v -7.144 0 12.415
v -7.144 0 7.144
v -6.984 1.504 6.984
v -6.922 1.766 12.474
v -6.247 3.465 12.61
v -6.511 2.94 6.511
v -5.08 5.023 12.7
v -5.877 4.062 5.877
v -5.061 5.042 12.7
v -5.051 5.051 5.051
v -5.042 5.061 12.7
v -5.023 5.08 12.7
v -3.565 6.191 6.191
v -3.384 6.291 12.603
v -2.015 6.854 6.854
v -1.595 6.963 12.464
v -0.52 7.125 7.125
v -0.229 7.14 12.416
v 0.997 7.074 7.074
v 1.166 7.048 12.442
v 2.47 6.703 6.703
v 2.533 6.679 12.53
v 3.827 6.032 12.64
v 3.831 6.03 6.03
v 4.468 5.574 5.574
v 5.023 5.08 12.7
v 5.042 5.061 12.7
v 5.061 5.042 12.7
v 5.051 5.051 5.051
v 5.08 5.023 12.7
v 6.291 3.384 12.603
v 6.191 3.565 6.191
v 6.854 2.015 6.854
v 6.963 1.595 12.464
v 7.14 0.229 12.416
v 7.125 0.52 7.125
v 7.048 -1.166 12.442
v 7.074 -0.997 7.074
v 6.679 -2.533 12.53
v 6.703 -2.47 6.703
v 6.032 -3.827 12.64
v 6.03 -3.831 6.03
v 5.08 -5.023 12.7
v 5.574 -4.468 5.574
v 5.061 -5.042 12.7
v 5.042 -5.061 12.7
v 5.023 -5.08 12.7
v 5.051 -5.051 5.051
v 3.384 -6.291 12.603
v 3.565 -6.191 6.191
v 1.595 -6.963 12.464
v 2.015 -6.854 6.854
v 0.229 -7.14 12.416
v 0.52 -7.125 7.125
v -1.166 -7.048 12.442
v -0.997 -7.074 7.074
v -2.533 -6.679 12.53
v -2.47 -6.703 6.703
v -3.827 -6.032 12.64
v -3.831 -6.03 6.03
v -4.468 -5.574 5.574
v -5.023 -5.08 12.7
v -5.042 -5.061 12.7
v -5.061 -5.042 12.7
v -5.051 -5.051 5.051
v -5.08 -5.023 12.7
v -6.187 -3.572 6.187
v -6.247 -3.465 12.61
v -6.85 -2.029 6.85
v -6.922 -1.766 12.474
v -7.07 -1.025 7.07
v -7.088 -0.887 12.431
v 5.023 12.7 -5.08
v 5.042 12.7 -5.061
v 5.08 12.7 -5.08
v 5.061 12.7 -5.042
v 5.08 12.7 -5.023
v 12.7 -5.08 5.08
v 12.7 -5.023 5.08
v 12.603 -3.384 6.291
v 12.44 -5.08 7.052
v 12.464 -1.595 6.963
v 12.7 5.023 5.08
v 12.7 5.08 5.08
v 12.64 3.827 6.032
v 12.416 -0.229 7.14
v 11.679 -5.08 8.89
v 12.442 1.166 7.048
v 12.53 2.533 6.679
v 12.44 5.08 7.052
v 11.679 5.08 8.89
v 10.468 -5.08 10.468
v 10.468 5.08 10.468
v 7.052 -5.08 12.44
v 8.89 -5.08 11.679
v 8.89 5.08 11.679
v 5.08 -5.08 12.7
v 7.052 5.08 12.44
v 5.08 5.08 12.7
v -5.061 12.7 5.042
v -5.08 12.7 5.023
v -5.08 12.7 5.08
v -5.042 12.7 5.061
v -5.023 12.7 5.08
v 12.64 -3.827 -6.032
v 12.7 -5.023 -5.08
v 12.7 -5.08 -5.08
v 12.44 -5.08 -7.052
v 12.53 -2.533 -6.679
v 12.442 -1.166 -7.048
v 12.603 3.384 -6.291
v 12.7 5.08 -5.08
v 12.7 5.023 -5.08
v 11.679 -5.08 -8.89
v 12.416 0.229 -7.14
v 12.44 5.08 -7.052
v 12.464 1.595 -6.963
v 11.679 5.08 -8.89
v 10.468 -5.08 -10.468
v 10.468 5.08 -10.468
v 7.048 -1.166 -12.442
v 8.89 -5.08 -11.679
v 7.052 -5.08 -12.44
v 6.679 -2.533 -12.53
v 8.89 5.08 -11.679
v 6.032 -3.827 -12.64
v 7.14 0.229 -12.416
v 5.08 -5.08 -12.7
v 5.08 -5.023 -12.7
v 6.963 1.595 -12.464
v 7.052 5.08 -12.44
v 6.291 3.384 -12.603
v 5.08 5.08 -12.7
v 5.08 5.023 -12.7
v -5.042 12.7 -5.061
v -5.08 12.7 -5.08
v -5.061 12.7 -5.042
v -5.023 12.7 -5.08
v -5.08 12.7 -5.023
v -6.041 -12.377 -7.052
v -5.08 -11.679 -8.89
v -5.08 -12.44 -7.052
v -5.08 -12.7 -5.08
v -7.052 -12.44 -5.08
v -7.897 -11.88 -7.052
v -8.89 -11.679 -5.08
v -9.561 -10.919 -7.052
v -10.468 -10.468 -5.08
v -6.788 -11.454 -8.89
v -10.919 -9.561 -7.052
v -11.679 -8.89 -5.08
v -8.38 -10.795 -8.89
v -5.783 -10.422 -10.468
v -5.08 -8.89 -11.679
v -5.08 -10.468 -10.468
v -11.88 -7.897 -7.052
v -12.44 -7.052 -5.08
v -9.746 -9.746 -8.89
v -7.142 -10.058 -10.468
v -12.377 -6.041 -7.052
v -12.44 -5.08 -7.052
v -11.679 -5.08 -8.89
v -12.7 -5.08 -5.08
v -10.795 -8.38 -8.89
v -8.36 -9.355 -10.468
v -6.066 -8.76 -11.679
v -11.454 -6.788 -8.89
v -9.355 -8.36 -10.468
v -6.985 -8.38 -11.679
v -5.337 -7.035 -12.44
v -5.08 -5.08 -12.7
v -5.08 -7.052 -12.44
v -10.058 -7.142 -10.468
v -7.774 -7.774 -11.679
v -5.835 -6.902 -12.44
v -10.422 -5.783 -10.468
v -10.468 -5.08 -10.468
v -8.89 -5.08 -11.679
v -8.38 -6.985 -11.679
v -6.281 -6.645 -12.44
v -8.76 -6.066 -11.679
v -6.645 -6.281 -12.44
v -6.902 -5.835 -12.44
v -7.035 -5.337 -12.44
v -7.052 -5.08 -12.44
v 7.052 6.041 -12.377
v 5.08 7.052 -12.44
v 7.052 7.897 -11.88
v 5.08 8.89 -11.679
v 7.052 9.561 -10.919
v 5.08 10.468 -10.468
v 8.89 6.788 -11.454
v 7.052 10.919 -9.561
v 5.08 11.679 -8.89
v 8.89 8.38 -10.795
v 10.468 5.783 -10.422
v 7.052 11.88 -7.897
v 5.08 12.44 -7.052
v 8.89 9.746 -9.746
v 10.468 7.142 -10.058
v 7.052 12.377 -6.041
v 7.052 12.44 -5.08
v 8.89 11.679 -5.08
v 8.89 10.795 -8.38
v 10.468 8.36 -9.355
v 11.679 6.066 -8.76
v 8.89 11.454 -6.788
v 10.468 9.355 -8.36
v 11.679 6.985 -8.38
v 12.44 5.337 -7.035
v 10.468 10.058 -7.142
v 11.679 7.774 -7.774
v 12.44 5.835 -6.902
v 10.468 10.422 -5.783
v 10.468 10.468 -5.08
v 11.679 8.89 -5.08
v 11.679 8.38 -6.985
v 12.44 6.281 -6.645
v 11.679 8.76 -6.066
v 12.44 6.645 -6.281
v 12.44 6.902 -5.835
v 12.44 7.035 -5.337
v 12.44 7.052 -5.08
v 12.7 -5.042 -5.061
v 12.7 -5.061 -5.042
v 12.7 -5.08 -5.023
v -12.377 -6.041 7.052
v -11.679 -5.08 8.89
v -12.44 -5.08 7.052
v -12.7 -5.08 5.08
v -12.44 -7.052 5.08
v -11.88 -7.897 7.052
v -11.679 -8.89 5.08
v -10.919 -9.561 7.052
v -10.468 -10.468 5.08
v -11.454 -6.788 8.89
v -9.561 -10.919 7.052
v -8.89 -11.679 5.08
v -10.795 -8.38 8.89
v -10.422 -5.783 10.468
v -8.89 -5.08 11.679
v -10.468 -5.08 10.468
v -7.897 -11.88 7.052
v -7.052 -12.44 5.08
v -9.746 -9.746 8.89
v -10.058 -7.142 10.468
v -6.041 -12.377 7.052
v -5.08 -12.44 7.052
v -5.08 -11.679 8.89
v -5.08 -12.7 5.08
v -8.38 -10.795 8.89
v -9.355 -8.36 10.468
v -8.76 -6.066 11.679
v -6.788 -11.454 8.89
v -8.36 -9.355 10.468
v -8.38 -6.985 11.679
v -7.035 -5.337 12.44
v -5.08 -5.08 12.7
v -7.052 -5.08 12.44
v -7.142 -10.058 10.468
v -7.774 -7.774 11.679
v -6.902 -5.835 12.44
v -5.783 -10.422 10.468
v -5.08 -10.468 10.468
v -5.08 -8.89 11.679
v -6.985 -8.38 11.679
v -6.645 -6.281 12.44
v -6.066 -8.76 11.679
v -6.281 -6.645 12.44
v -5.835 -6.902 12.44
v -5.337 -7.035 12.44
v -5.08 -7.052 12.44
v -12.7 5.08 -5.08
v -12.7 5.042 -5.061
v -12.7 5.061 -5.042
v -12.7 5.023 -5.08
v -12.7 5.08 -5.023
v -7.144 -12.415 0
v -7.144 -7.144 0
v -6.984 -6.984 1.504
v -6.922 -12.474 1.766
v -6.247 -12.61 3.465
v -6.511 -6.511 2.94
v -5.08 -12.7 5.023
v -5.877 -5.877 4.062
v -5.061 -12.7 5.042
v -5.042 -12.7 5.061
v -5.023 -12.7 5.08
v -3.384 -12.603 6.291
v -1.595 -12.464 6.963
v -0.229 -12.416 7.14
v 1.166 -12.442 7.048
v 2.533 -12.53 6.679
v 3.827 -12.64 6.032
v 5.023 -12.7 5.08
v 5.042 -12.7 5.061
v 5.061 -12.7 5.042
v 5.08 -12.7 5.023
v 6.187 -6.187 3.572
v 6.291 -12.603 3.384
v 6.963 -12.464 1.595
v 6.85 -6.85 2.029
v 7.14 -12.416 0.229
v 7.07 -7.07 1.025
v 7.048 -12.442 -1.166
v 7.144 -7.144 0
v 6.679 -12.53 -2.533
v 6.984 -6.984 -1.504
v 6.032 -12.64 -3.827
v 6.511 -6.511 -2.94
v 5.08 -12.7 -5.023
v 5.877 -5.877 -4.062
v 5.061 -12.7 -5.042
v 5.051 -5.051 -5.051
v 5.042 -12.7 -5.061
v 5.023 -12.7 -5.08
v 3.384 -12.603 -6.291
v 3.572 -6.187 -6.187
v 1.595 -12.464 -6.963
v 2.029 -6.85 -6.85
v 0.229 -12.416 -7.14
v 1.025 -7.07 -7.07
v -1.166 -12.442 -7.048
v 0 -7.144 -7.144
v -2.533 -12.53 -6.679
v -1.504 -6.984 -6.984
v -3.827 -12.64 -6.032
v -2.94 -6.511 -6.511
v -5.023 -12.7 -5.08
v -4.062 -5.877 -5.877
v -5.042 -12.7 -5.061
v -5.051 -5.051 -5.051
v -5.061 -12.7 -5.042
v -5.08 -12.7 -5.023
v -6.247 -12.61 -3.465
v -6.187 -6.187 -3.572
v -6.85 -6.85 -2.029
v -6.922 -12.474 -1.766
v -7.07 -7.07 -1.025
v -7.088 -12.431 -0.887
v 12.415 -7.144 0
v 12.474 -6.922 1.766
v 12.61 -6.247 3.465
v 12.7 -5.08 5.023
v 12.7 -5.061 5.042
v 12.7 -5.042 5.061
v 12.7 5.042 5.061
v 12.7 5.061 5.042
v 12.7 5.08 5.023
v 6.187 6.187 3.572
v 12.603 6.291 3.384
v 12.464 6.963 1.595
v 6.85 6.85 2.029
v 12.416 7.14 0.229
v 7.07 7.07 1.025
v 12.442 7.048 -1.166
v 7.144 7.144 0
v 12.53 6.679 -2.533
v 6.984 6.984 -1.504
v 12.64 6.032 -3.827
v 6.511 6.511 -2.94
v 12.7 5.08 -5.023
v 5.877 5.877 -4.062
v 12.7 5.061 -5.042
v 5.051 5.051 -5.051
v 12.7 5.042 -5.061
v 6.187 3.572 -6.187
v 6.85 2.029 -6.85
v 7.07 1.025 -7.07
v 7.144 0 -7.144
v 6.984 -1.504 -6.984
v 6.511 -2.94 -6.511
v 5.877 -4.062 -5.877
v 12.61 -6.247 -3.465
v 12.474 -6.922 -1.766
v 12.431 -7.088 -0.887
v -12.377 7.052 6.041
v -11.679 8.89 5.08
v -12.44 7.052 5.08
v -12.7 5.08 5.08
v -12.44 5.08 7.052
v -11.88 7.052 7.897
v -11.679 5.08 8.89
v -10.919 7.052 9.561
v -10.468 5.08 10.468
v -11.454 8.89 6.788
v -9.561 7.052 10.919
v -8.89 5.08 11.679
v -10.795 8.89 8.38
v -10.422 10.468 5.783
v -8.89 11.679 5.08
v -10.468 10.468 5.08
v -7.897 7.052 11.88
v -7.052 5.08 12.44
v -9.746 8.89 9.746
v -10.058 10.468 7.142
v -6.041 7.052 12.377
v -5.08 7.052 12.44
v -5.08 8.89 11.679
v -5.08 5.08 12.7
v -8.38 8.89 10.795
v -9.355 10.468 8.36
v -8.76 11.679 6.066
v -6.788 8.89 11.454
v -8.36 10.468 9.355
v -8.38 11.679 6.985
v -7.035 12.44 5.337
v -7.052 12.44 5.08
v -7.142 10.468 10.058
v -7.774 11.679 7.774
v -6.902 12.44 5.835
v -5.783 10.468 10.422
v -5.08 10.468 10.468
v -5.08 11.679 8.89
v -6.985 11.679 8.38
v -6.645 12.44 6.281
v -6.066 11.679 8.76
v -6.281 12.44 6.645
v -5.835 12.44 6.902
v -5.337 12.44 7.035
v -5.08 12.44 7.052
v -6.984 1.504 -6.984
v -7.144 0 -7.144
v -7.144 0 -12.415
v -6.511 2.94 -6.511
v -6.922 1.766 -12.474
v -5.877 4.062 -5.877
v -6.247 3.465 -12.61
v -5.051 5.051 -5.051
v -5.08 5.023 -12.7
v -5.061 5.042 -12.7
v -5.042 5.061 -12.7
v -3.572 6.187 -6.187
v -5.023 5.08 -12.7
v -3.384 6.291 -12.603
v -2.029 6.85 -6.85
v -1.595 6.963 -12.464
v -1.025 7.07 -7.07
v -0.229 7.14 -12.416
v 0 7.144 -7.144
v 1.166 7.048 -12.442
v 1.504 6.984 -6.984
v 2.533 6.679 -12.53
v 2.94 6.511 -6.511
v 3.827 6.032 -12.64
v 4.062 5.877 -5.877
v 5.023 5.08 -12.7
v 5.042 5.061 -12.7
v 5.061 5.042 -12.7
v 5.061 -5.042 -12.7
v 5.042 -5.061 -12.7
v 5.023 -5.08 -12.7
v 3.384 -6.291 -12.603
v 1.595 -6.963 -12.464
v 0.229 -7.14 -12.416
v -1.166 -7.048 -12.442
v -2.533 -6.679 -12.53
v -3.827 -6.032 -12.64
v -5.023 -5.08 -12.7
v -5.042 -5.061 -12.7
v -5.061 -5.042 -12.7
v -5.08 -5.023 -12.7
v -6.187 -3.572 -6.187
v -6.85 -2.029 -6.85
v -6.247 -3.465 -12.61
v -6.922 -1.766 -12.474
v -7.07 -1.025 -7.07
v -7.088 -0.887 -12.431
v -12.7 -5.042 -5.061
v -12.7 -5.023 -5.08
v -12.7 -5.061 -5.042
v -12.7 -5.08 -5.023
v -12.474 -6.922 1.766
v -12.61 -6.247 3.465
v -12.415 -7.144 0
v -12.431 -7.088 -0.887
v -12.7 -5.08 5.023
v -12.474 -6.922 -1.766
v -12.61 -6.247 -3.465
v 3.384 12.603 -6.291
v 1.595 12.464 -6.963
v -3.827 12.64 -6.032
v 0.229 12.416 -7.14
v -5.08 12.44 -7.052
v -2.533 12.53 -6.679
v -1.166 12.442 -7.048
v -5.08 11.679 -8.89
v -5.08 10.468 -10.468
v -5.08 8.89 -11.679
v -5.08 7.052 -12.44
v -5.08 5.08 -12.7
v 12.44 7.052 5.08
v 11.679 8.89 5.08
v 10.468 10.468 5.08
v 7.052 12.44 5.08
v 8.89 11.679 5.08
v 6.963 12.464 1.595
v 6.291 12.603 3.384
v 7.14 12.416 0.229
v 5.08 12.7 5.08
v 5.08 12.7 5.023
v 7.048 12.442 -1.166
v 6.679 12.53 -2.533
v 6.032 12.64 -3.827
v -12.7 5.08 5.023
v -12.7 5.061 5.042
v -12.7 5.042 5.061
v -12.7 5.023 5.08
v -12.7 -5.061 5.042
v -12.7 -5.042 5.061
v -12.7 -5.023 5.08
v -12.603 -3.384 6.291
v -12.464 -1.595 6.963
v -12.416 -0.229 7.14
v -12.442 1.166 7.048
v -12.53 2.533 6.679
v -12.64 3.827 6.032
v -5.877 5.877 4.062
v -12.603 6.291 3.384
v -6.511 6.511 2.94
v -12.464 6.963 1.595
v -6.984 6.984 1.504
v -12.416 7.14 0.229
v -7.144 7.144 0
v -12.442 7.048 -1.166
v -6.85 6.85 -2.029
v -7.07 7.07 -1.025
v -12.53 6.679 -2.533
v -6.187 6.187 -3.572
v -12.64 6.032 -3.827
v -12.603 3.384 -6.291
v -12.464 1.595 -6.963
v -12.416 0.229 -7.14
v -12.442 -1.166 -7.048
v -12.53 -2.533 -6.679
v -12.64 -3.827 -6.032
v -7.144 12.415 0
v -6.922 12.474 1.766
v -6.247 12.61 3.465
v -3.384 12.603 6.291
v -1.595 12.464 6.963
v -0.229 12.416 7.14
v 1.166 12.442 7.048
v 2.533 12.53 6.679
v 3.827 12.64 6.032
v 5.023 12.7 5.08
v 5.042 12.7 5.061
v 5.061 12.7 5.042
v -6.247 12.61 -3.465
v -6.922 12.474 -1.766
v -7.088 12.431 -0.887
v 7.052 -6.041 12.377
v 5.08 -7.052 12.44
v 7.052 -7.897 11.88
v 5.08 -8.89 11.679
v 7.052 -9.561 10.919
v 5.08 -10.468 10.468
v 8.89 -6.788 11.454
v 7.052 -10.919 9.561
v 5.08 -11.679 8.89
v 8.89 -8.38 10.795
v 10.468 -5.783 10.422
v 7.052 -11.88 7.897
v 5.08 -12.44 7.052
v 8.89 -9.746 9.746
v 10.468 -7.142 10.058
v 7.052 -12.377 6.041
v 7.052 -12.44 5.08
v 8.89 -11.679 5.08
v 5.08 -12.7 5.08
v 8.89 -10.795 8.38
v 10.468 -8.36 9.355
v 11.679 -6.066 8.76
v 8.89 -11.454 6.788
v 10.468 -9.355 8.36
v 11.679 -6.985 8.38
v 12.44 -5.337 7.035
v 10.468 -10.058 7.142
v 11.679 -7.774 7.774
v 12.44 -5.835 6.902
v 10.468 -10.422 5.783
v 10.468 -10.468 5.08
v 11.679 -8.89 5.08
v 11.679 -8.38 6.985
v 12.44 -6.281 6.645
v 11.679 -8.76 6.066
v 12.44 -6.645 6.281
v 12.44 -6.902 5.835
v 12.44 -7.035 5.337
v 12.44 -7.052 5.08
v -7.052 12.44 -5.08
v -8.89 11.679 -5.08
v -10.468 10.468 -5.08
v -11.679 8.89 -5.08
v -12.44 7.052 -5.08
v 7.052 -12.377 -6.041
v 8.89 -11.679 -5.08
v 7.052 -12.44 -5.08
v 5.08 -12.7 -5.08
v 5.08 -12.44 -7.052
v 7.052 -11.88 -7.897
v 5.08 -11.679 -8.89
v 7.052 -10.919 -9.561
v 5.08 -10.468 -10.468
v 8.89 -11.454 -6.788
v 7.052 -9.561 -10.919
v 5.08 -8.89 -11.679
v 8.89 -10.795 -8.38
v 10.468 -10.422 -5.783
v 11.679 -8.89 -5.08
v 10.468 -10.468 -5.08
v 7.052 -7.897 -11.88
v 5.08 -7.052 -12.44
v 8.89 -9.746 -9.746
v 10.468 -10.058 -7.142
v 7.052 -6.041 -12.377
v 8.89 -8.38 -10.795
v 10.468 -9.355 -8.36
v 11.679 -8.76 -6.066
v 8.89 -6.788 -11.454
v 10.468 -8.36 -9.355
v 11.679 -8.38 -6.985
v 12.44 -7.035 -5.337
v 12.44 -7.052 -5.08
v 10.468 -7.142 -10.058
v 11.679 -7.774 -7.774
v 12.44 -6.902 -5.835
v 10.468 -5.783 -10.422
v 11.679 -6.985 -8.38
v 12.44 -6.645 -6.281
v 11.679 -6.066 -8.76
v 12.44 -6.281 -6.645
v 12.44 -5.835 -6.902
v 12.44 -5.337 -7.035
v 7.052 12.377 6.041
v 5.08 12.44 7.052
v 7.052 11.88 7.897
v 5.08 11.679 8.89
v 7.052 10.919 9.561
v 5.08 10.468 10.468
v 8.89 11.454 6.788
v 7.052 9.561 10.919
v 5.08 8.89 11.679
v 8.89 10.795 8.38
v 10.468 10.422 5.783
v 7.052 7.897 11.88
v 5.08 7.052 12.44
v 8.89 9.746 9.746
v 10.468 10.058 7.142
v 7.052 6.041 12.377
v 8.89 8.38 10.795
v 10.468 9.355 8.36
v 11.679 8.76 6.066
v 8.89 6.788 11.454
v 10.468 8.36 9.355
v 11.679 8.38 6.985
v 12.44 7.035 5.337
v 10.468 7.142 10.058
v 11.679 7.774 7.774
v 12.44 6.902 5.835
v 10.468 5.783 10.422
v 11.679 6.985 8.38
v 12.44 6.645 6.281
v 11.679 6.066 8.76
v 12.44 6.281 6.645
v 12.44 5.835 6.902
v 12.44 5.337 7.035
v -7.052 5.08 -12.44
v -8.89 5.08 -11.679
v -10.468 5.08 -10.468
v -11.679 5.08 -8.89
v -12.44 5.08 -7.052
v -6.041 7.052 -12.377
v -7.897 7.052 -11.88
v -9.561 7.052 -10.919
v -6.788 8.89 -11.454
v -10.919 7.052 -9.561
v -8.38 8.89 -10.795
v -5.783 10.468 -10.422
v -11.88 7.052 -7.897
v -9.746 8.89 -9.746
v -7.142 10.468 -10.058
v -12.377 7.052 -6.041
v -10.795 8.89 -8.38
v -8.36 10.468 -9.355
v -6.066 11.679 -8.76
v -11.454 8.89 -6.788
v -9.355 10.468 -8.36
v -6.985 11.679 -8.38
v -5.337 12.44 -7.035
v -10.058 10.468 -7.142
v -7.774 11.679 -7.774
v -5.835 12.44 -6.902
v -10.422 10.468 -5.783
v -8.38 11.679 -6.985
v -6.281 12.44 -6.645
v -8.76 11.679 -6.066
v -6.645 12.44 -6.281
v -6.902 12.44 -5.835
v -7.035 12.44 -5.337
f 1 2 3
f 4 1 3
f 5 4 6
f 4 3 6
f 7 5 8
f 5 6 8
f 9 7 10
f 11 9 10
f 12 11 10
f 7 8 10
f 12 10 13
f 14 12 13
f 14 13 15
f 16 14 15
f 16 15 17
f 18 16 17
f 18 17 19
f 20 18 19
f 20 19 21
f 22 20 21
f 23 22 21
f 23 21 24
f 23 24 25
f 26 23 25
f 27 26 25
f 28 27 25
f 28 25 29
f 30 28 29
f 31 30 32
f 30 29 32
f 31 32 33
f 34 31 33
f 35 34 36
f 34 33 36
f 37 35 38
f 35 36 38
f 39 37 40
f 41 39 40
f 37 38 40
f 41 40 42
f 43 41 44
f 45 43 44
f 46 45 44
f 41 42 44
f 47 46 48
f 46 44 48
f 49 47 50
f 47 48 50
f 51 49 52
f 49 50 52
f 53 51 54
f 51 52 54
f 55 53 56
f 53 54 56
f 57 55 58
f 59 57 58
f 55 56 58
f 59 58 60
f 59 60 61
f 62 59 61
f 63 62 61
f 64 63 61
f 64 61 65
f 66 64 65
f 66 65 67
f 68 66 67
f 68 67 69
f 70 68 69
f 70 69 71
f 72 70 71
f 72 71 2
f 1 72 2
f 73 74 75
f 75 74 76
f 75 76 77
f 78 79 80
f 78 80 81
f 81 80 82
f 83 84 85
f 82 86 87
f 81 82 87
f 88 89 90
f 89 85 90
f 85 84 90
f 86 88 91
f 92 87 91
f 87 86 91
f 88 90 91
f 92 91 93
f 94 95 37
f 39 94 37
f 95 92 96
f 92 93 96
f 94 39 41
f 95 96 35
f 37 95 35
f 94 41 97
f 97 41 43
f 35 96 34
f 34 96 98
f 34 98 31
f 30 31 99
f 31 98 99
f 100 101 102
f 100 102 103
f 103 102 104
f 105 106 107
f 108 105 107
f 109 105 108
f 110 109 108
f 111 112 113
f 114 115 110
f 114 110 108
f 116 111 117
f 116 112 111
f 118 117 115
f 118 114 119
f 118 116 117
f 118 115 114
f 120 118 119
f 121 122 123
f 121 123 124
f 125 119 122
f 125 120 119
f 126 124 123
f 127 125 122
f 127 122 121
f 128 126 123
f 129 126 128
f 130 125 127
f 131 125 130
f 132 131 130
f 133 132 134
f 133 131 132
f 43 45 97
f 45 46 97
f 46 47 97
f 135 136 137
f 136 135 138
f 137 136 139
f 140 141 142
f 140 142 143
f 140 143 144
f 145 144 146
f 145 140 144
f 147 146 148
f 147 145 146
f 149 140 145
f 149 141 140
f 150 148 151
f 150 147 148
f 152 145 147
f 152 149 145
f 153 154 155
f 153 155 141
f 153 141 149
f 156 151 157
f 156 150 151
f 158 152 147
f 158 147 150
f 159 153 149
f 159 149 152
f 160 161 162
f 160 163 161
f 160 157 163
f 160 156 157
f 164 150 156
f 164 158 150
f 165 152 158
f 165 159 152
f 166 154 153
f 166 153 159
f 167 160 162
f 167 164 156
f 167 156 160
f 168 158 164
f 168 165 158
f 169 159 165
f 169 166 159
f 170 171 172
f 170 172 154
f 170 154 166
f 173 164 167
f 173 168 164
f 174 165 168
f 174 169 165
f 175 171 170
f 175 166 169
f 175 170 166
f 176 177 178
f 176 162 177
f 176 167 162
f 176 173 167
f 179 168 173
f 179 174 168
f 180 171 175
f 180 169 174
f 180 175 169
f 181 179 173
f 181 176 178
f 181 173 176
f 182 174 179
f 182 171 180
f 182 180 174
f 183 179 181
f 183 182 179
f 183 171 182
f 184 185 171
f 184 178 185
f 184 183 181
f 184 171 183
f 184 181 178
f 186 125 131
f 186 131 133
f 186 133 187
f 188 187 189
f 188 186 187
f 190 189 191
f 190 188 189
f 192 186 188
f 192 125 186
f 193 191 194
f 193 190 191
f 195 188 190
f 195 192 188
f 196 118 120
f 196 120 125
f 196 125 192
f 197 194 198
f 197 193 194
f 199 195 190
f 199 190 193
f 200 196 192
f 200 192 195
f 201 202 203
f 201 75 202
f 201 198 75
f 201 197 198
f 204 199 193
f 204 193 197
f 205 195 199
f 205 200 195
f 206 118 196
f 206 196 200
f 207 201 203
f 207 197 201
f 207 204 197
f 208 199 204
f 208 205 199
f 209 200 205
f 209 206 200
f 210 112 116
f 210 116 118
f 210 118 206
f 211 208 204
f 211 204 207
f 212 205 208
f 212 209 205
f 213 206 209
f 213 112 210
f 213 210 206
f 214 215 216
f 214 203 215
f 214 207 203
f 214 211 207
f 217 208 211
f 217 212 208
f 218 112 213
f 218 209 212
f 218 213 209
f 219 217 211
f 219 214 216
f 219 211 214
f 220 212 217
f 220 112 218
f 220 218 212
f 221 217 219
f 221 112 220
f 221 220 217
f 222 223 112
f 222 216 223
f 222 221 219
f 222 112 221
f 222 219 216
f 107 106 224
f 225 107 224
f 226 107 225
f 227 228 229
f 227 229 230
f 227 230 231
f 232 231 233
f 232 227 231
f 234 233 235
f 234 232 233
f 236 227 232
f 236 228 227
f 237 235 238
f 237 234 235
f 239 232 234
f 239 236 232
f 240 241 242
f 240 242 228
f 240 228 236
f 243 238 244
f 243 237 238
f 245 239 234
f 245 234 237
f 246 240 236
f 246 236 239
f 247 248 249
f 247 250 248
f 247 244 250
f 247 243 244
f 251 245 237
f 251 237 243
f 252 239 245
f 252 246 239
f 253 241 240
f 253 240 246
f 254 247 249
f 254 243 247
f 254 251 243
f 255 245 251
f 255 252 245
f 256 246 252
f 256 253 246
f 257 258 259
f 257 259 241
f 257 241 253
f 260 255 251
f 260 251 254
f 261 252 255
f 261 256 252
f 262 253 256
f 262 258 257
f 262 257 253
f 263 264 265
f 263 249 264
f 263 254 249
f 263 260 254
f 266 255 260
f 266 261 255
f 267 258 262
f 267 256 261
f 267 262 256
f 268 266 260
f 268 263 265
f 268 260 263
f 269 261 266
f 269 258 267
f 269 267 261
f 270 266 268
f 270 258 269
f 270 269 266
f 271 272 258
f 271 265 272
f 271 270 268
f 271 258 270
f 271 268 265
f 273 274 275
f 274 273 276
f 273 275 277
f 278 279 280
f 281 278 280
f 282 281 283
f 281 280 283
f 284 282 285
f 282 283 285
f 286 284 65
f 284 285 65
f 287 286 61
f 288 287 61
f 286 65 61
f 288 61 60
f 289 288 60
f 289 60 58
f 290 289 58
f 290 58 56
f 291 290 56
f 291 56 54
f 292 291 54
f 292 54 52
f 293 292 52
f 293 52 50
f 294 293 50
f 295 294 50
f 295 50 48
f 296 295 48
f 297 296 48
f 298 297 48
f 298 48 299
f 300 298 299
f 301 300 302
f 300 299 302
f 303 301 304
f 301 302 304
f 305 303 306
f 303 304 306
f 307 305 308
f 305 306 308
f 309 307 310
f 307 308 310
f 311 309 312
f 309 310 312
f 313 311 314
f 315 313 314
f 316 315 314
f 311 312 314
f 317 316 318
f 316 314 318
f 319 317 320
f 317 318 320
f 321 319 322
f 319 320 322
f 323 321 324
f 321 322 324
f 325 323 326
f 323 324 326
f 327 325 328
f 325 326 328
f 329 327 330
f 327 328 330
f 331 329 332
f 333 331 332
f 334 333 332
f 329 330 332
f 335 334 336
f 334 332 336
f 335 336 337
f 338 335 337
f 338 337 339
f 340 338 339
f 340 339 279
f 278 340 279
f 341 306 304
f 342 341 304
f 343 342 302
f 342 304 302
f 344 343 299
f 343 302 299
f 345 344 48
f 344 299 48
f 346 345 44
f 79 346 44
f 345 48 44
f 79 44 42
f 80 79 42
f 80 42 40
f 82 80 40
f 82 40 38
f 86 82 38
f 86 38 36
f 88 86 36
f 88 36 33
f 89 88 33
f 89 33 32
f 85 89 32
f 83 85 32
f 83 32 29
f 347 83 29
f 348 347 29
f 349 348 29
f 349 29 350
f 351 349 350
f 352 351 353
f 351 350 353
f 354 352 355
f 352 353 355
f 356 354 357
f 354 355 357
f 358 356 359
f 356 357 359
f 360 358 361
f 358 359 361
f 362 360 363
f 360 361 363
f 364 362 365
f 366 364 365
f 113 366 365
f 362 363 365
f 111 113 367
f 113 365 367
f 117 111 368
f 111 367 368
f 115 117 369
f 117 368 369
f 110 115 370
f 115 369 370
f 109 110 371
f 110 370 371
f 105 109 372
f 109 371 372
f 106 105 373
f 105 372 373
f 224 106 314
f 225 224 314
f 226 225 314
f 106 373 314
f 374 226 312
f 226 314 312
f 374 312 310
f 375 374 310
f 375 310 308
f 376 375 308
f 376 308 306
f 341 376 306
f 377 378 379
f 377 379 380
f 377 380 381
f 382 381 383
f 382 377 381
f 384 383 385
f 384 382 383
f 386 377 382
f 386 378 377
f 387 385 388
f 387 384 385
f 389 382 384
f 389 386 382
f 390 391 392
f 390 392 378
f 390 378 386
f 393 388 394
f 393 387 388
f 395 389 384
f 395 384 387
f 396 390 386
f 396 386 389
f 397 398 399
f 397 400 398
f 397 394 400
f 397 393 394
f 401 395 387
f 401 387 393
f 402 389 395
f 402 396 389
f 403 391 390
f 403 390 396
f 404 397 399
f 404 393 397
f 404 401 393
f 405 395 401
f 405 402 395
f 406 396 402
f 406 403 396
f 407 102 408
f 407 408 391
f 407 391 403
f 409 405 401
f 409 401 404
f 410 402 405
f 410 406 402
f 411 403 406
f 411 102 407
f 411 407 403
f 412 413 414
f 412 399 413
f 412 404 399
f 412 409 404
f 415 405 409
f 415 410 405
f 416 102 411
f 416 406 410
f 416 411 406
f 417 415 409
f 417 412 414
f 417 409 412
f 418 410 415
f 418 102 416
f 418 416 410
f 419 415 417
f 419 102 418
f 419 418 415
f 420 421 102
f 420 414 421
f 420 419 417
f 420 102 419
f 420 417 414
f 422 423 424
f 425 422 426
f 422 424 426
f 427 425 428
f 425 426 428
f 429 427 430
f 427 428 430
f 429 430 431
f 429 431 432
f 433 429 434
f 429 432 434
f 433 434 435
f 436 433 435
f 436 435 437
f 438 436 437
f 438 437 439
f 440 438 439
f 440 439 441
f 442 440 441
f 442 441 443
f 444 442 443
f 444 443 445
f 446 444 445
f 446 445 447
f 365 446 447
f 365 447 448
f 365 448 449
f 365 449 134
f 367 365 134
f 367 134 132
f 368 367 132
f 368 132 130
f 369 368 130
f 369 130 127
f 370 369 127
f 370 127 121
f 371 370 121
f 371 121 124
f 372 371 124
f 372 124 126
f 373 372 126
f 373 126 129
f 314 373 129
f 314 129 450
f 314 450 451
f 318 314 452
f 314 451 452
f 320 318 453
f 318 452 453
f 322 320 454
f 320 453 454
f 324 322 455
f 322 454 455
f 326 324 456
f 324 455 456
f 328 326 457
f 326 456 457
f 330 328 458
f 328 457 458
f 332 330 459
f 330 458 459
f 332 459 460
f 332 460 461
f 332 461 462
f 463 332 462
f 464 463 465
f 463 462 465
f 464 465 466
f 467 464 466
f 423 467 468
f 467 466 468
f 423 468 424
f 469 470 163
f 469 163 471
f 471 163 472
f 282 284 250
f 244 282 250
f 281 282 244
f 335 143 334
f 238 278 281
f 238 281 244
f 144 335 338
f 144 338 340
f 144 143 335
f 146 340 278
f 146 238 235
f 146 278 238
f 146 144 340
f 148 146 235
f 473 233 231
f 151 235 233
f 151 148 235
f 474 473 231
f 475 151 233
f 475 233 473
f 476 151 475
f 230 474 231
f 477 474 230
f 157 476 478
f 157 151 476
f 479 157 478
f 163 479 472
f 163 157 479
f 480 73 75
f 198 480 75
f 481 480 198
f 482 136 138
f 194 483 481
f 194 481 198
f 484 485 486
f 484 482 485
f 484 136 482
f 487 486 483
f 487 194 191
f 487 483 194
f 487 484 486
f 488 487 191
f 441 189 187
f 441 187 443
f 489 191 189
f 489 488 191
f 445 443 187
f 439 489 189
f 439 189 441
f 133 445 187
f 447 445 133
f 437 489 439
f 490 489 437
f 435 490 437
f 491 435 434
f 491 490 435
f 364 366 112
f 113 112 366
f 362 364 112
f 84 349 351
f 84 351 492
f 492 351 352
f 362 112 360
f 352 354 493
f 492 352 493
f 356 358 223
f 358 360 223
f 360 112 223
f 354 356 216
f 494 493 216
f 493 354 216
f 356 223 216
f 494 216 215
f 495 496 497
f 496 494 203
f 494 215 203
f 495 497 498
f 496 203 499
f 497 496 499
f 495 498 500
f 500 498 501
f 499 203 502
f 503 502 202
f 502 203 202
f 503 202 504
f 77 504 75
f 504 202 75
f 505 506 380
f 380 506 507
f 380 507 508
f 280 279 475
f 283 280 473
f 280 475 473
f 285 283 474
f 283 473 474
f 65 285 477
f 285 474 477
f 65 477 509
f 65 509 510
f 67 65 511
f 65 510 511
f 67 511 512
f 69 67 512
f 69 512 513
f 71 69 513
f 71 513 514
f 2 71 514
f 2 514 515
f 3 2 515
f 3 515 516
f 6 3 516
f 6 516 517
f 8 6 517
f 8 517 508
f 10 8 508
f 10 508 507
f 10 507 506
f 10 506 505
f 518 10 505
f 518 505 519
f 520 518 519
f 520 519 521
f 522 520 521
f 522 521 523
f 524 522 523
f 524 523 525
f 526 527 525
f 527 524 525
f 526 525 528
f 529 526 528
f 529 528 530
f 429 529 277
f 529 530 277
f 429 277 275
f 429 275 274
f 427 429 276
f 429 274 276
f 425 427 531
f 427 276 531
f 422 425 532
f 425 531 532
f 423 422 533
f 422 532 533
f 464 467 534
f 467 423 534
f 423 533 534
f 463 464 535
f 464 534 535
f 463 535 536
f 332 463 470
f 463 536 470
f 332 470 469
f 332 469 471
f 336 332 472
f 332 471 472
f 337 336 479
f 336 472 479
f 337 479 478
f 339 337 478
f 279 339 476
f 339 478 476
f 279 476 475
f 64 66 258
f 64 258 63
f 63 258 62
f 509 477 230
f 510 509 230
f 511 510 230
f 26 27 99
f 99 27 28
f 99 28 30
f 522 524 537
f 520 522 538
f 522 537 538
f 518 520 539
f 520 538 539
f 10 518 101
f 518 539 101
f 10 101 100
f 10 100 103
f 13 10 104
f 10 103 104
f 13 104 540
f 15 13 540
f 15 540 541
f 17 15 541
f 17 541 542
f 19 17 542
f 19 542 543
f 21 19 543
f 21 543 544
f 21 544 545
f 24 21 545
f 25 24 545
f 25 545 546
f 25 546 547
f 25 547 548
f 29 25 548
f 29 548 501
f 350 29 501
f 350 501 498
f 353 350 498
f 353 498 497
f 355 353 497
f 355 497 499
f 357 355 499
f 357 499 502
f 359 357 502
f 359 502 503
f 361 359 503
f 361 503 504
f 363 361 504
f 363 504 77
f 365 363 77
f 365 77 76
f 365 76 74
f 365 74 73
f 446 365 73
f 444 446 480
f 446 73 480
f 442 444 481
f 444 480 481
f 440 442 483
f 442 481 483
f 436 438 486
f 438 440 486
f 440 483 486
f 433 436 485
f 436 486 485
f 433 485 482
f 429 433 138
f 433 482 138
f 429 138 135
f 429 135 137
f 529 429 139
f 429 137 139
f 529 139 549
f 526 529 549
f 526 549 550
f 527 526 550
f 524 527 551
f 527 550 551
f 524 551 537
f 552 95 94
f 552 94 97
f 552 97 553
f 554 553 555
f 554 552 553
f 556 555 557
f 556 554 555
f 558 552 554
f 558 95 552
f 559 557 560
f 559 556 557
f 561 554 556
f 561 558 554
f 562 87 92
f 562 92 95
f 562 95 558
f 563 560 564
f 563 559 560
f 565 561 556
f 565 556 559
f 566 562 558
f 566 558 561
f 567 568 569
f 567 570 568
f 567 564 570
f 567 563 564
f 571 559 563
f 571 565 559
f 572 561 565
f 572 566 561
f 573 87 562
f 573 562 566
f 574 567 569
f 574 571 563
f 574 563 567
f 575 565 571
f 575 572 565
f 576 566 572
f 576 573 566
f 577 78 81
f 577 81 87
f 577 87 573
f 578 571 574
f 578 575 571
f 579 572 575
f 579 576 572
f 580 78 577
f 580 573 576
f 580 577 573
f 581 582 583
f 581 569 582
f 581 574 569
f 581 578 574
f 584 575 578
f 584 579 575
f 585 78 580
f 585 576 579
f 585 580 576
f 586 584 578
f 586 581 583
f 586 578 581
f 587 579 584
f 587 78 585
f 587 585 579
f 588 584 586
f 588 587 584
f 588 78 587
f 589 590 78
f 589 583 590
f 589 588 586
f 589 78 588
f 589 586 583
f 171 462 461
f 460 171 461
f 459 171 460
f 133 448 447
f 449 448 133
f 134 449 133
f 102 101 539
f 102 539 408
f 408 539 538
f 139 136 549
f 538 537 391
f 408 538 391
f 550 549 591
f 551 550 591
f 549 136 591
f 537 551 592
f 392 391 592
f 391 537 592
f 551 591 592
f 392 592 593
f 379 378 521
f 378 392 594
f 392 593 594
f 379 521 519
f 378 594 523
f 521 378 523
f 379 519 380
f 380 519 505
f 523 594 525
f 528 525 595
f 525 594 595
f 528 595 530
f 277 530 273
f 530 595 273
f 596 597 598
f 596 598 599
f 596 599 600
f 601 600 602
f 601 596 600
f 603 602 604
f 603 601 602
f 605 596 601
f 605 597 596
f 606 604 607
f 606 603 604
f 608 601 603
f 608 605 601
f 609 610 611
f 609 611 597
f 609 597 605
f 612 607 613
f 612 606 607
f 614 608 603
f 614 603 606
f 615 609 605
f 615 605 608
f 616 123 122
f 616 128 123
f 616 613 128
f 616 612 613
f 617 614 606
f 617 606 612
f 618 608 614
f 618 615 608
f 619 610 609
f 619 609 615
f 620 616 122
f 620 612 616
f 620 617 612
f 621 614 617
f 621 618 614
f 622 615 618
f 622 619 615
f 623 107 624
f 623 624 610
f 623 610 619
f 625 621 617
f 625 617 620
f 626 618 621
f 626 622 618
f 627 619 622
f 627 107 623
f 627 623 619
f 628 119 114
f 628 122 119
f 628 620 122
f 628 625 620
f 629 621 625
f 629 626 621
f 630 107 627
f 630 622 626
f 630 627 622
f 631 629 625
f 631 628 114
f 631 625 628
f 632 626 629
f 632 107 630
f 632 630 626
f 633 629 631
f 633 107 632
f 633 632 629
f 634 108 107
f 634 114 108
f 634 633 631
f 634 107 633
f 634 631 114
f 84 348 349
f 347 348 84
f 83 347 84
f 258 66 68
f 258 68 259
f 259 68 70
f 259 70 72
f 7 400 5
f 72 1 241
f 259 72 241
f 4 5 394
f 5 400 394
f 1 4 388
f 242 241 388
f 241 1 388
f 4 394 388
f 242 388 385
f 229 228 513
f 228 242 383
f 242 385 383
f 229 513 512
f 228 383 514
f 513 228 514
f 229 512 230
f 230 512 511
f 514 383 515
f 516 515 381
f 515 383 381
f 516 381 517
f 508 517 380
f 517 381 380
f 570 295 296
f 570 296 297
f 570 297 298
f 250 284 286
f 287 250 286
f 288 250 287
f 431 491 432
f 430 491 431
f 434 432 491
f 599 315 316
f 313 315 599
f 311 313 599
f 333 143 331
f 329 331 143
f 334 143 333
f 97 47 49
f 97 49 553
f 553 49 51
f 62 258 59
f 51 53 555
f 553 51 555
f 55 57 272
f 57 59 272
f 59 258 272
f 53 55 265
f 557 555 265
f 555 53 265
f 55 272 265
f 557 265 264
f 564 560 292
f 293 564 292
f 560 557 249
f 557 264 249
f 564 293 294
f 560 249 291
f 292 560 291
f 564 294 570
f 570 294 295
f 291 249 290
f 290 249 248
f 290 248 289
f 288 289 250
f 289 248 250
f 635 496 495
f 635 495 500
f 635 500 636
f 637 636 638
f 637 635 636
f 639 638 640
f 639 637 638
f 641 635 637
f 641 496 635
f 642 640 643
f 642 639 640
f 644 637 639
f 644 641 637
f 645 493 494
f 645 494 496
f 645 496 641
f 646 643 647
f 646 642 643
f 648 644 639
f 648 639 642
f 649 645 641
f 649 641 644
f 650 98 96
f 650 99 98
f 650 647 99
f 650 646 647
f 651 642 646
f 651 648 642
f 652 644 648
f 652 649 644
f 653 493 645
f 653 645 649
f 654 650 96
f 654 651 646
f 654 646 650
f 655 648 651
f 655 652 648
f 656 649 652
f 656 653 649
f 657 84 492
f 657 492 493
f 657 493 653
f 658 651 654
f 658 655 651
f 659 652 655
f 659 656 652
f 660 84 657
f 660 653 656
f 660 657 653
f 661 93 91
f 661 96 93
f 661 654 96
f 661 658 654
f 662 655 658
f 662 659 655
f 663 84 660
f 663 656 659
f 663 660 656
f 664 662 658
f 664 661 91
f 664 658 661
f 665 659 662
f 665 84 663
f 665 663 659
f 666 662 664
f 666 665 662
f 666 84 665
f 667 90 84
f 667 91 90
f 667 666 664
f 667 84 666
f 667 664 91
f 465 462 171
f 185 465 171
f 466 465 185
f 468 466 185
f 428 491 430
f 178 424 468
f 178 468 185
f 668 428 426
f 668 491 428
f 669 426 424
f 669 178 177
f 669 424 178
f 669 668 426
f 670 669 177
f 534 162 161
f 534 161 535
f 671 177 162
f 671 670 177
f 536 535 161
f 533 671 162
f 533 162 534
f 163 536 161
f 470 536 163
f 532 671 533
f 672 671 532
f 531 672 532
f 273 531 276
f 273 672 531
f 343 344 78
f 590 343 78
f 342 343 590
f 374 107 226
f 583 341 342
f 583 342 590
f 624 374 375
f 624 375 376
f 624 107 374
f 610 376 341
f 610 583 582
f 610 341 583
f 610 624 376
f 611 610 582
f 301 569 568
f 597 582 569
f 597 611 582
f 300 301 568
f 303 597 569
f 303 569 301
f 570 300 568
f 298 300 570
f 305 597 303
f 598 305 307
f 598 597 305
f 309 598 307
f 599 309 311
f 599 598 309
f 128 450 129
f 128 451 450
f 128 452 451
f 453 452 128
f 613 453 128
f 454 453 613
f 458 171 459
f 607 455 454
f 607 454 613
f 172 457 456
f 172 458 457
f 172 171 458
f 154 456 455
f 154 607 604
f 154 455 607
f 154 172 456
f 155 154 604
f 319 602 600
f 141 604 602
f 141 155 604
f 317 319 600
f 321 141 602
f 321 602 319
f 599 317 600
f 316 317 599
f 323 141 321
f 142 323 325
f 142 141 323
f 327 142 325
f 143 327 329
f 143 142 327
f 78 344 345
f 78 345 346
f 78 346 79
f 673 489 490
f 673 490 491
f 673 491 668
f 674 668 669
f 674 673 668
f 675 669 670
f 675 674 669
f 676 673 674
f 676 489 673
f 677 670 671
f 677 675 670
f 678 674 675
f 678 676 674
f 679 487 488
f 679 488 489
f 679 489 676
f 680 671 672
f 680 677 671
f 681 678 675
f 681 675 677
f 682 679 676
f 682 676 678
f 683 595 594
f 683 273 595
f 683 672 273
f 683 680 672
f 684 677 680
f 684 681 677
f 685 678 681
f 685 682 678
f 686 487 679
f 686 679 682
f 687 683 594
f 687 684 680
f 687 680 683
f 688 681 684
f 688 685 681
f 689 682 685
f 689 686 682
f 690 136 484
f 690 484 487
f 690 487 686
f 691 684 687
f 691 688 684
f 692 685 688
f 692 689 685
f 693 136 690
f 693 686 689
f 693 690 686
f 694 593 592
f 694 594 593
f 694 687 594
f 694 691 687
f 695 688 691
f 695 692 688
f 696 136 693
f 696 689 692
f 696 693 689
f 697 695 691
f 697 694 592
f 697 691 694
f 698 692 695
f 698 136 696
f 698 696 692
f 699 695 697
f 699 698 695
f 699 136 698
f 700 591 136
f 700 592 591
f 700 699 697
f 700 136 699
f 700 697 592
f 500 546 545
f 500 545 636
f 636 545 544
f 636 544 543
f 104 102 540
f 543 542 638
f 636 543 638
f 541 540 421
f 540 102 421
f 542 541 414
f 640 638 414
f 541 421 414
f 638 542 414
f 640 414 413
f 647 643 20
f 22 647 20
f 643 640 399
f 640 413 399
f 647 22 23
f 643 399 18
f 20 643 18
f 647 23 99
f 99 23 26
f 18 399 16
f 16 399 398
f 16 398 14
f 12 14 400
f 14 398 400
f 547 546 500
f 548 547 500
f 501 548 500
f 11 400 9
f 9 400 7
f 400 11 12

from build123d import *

# Parameters (mm, degrees)
F0_W         = 25.4
F0_H         = 25.4
F1_DEPTH     = 12.7
F5_D         = 14.2875
F5_ON_F3_D   = 14.2875
F5_ON_F2_D   = 14.2875
F6_T1_DEPTH  = 10.16
F6_T3_DEPTH  = 10.16
F6_T5_DEPTH  = 10.16
F6_S9_W      = 7.62
F6_S9_H      = 7.62
F6_T10_DEPTH = 7.62
F6_S15_W     = 7.62
F6_S15_H     = 7.62
F6_T16_DEPTH = 7.62
F6_S21_W     = 7.62
F6_S21_H     = 7.62
F6_T22_DEPTH = 7.62
F6_S27_W     = 7.62
F6_S27_H     = 7.62
F6_T28_DEPTH = 7.62
F6_S33_W     = 7.62
F6_S33_H     = 7.62
F6_T34_DEPTH = 7.62
F6_S39_W     = 7.62
F6_S39_H     = 7.62
F6_T40_DEPTH = 7.62
F6_S45_W     = 7.62
F6_S45_H     = 7.62
F6_T46_DEPTH = 7.62
F6_S51_W     = 7.62
F6_S51_H     = 7.62
F6_T52_DEPTH = 7.62


# Not quite as in the source:
# - a fillet or chamfer that OpenCascade refuses, or shapes differently, is made with other operations: its cross-section is extruded or revolved along the edge and cut away or added
# - a length typed as a fraction of an inch, garbled in the dataset ("3 / 203.2 mm" for 3/8 in), is restored


with BuildPart() as f1:
    # F0 (on Front) → F1 (new body, symmetric)
    with BuildSketch(Plane.XZ):
        Rectangle(F0_W, F0_H)
    extrude(amount=F1_DEPTH, both=True)

    # F5 (through all)
    with Locations(Plane.XY.offset(12.7)):
        with Locations((0, 0)):
            Hole(F5_D / 2)

    # F5 on F3 (through all)
    with Locations(Plane.XZ.offset(12.7)):
        with Locations((0, 0)):
            Hole(F5_ON_F3_D / 2)

    # F5 on F2 (through all)
    with Locations(Plane.YZ.offset(12.7)):
        with Locations((0, 0)):
            Hole(F5_ON_F2_D / 2)

    # F6: fillet of radius 7.62 on 12 edges, made by hand

    # F6_s2 → F6_t1 (cut)
    with BuildSketch(Plane.XZ.offset(-5.08)):
        with BuildLine():
            ThreePointArc((12.7, 5.08), (10.4681536726, 10.4681536726), (5.08, 12.7))
            Line((5.08, 12.7), (12.7, 12.7))
            Line((12.7, 12.7), (12.7, 5.08))
        make_face()
        with BuildLine():
            ThreePointArc((12.7, -5.08), (10.4681536726, -10.4681536726), (5.08, -12.7))
            Line((5.08, -12.7), (12.7, -12.7))
            Line((12.7, -12.7), (12.7, -5.08))
        make_face()
        with BuildLine():
            ThreePointArc((-5.08, 12.7), (-10.4681536726, 10.4681536726), (-12.7, 5.08))
            Line((-12.7, 5.08), (-12.7, 12.7))
            Line((-12.7, 12.7), (-5.08, 12.7))
        make_face()
        with BuildLine():
            ThreePointArc((-5.08, -12.7), (-10.4681536726, -10.4681536726), (-12.7, -5.08))
            Line((-12.7, -5.08), (-12.7, -12.7))
            Line((-12.7, -12.7), (-5.08, -12.7))
        make_face()
    extrude(amount=F6_T1_DEPTH, mode=Mode.SUBTRACT)

    # F6_s4 → F6_t3 (cut)
    with BuildSketch(Plane.XY.offset(-5.08)):
        with BuildLine():
            ThreePointArc((12.7, 5.08), (10.4681536726, 10.4681536726), (5.08, 12.7))
            Line((5.08, 12.7), (12.7, 12.7))
            Line((12.7, 12.7), (12.7, 5.08))
        make_face()
        with BuildLine():
            ThreePointArc((12.7, -5.08), (10.4681536726, -10.4681536726), (5.08, -12.7))
            Line((5.08, -12.7), (12.7, -12.7))
            Line((12.7, -12.7), (12.7, -5.08))
        make_face()
        with BuildLine():
            ThreePointArc((-5.08, -12.7), (-10.4681536726, -10.4681536726), (-12.7, -5.08))
            Line((-12.7, -5.08), (-12.7, -12.7))
            Line((-12.7, -12.7), (-5.08, -12.7))
        make_face()
        with BuildLine():
            ThreePointArc((-5.08, 12.7), (-10.4681536726, 10.4681536726), (-12.7, 5.08))
            Line((-12.7, 5.08), (-12.7, 12.7))
            Line((-12.7, 12.7), (-5.08, 12.7))
        make_face()
    extrude(amount=F6_T3_DEPTH, mode=Mode.SUBTRACT)

    # F6_s6 → F6_t5 (cut)
    with BuildSketch(Plane.YZ.offset(-5.08)):
        with BuildLine():
            ThreePointArc((-5.08, 12.7), (-10.4681536726, 10.4681536726), (-12.7, 5.08))
            Line((-12.7, 5.08), (-12.7, 12.7))
            Line((-12.7, 12.7), (-5.08, 12.7))
        make_face()
        with BuildLine():
            ThreePointArc((-5.08, -12.7), (-10.4681536726, -10.4681536726), (-12.7, -5.08))
            Line((-12.7, -5.08), (-12.7, -12.7))
            Line((-12.7, -12.7), (-5.08, -12.7))
        make_face()
        with BuildLine():
            ThreePointArc((12.7, 5.08), (10.4681536726, 10.4681536726), (5.08, 12.7))
            Line((5.08, 12.7), (12.7, 12.7))
            Line((12.7, 12.7), (12.7, 5.08))
        make_face()
        with BuildLine():
            ThreePointArc((12.7, -5.08), (10.4681536726, -10.4681536726), (5.08, -12.7))
            Line((5.08, -12.7), (12.7, -12.7))
            Line((12.7, -12.7), (12.7, -5.08))
        make_face()
    extrude(amount=F6_T5_DEPTH, mode=Mode.SUBTRACT)


with BuildPart() as f6_tool8:
    # F6_s9 → F6_t10 (new body)
    with BuildSketch(Plane.YZ.offset(5.08)):
        with Locations((8.89, 8.89)):
            Rectangle(F6_S9_W, F6_S9_H)
    extrude(amount=F6_T10_DEPTH)

    # F6_s11 → F6_t12 (revolve, cut)
    with BuildSketch(Plane(origin=(5.08, 5.08, 5.08), x_dir=(0, -0.7071067812, -0.7071067812), z_dir=(0, -0.7071067812, 0.7071067812))):
        with BuildLine():
            ThreePointArc((0, -7.62), (7.62, 0), (0, 7.62))
            Line((0, 7.62), (0, -7.62))
        make_face()
    revolve(axis=Axis((5.08, 5.08, 5.08), (1, 0, 0)), mode=Mode.SUBTRACT)


with BuildPart() as f1_1:
    add(f1.part)

    # F6_t7: cut F6_tool8
    add(f6_tool8.part, mode=Mode.SUBTRACT)


with BuildPart() as f6_tool14:
    # F6_s15 → F6_t16 (new body)
    with BuildSketch(Plane.YZ.offset(5.08)):
        with Locations((-8.89, 8.89)):
            Rectangle(F6_S15_W, F6_S15_H)
    extrude(amount=F6_T16_DEPTH)

    # F6_s17 → F6_t18 (revolve, cut)
    with BuildSketch(Plane(origin=(5.08, -5.08, 5.08), x_dir=(0, 0.7071067812, -0.7071067812), z_dir=(0, -0.7071067812, -0.7071067812))):
        with BuildLine():
            ThreePointArc((0, -7.62), (7.62, 0), (0, 7.62))
            Line((0, 7.62), (0, -7.62))
        make_face()
    revolve(axis=Axis((5.08, -5.08, 5.08), (1, 0, 0)), mode=Mode.SUBTRACT)


with BuildPart() as f1_2:
    add(f1_1.part)

    # F6_t13: cut F6_tool14
    add(f6_tool14.part, mode=Mode.SUBTRACT)


with BuildPart() as f6_tool20:
    # F6_s21 → F6_t22 (new body)
    with BuildSketch(Plane.YZ.offset(5.08)):
        with Locations((-8.89, -8.89)):
            Rectangle(F6_S21_W, F6_S21_H)
    extrude(amount=F6_T22_DEPTH)

    # F6_s23 → F6_t24 (revolve, cut)
    with BuildSketch(Plane(origin=(5.08, -5.08, -5.08), x_dir=(0, 0.7071067812, 0.7071067812), z_dir=(0, 0.7071067812, -0.7071067812))):
        with BuildLine():
            ThreePointArc((0, -7.62), (7.62, 0), (0, 7.62))
            Line((0, 7.62), (0, -7.62))
        make_face()
    revolve(axis=Axis((5.08, -5.08, -5.08), (1, 0, 0)), mode=Mode.SUBTRACT)


with BuildPart() as f1_3:
    add(f1_2.part)

    # F6_t19: cut F6_tool20
    add(f6_tool20.part, mode=Mode.SUBTRACT)


with BuildPart() as f6_tool26:
    # F6_s27 → F6_t28 (new body)
    with BuildSketch(Plane.YZ.offset(5.08)):
        with Locations((8.89, -8.89)):
            Rectangle(F6_S27_W, F6_S27_H)
    extrude(amount=F6_T28_DEPTH)

    # F6_s29 → F6_t30 (revolve, cut)
    with BuildSketch(Plane(origin=(5.08, 5.08, -5.08), x_dir=(0, -0.7071067812, 0.7071067812), z_dir=(0, 0.7071067812, 0.7071067812))):
        with BuildLine():
            ThreePointArc((0, -7.62), (7.62, 0), (0, 7.62))
            Line((0, 7.62), (0, -7.62))
        make_face()
    revolve(axis=Axis((5.08, 5.08, -5.08), (1, 0, 0)), mode=Mode.SUBTRACT)


with BuildPart() as f1_4:
    add(f1_3.part)

    # F6_t25: cut F6_tool26
    add(f6_tool26.part, mode=Mode.SUBTRACT)


with BuildPart() as f6_tool32:
    # F6_s33 → F6_t34 (new body)
    with BuildSketch(Plane.XY.offset(5.08)):
        with Locations((-8.89, -8.89)):
            Rectangle(F6_S33_W, F6_S33_H)
    extrude(amount=F6_T34_DEPTH)

    # F6_s35 → F6_t36 (revolve, cut)
    with BuildSketch(Plane(origin=(-5.08, -5.08, 5.08), x_dir=(0.7071067812, 0.7071067812, 0), z_dir=(0.7071067812, -0.7071067812, 0))):
        with BuildLine():
            ThreePointArc((0, -7.62), (7.62, 0), (0, 7.62))
            Line((0, 7.62), (0, -7.62))
        make_face()
    revolve(axis=Axis((-5.08, -5.08, 5.08), (0, 0, 1)), mode=Mode.SUBTRACT)


with BuildPart() as f1_5:
    add(f1_4.part)

    # F6_t31: cut F6_tool32
    add(f6_tool32.part, mode=Mode.SUBTRACT)


with BuildPart() as f6_tool38:
    # F6_s39 → F6_t40 (new body)
    with BuildSketch(Plane.XY.offset(-5.08)):
        with Locations((-8.89, -8.89)):
            Rectangle(F6_S39_W, F6_S39_H)
    extrude(amount=-F6_T40_DEPTH)

    # F6_s41 → F6_t42 (revolve, cut)
    with BuildSketch(Plane(origin=(-5.08, -5.08, -5.08), x_dir=(0.7071067812, 0.7071067812, 0), z_dir=(-0.7071067812, 0.7071067812, 0))):
        with BuildLine():
            ThreePointArc((0, -7.62), (7.62, 0), (0, 7.62))
            Line((0, 7.62), (0, -7.62))
        make_face()
    revolve(axis=Axis((-5.08, -5.08, -5.08), (0, 0, -1)), mode=Mode.SUBTRACT)


with BuildPart() as f1_6:
    add(f1_5.part)

    # F6_t37: cut F6_tool38
    add(f6_tool38.part, mode=Mode.SUBTRACT)


with BuildPart() as f6_tool44:
    # F6_s45 → F6_t46 (new body)
    with BuildSketch(Plane.XZ.offset(-5.08)):
        with Locations((-8.89, 8.89)):
            Rectangle(F6_S45_W, F6_S45_H)
    extrude(amount=-F6_T46_DEPTH)

    # F6_s47 → F6_t48 (revolve, cut)
    with BuildSketch(Plane(origin=(-5.08, 5.08, 5.08), x_dir=(0.7071067812, 0, -0.7071067812), z_dir=(0.7071067812, 0, 0.7071067812))):
        with BuildLine():
            ThreePointArc((0, -7.62), (7.62, 0), (0, 7.62))
            Line((0, 7.62), (0, -7.62))
        make_face()
    revolve(axis=Axis((-5.08, 5.08, 5.08), (0, 1, 0)), mode=Mode.SUBTRACT)


with BuildPart() as f1_7:
    add(f1_6.part)

    # F6_t43: cut F6_tool44
    add(f6_tool44.part, mode=Mode.SUBTRACT)


with BuildPart() as f6_tool50:
    # F6_s51 → F6_t52 (new body)
    with BuildSketch(Plane.XZ.offset(-5.08)):
        with Locations((-8.89, -8.89)):
            Rectangle(F6_S51_W, F6_S51_H)
    extrude(amount=-F6_T52_DEPTH)

    # F6_s53 → F6_t54 (revolve, cut)
    with BuildSketch(Plane(origin=(-5.08, 5.08, -5.08), x_dir=(0.7071067812, 0, 0.7071067812), z_dir=(-0.7071067812, 0, 0.7071067812))):
        with BuildLine():
            ThreePointArc((0, -7.62), (7.62, 0), (0, 7.62))
            Line((0, 7.62), (0, -7.62))
        make_face()
    revolve(axis=Axis((-5.08, 5.08, -5.08), (0, 1, 0)), mode=Mode.SUBTRACT)


with BuildPart() as f1_8:
    add(f1_7.part)

    # F6_t49: cut F6_tool50
    add(f6_tool50.part, mode=Mode.SUBTRACT)


solid = f1_8.part
